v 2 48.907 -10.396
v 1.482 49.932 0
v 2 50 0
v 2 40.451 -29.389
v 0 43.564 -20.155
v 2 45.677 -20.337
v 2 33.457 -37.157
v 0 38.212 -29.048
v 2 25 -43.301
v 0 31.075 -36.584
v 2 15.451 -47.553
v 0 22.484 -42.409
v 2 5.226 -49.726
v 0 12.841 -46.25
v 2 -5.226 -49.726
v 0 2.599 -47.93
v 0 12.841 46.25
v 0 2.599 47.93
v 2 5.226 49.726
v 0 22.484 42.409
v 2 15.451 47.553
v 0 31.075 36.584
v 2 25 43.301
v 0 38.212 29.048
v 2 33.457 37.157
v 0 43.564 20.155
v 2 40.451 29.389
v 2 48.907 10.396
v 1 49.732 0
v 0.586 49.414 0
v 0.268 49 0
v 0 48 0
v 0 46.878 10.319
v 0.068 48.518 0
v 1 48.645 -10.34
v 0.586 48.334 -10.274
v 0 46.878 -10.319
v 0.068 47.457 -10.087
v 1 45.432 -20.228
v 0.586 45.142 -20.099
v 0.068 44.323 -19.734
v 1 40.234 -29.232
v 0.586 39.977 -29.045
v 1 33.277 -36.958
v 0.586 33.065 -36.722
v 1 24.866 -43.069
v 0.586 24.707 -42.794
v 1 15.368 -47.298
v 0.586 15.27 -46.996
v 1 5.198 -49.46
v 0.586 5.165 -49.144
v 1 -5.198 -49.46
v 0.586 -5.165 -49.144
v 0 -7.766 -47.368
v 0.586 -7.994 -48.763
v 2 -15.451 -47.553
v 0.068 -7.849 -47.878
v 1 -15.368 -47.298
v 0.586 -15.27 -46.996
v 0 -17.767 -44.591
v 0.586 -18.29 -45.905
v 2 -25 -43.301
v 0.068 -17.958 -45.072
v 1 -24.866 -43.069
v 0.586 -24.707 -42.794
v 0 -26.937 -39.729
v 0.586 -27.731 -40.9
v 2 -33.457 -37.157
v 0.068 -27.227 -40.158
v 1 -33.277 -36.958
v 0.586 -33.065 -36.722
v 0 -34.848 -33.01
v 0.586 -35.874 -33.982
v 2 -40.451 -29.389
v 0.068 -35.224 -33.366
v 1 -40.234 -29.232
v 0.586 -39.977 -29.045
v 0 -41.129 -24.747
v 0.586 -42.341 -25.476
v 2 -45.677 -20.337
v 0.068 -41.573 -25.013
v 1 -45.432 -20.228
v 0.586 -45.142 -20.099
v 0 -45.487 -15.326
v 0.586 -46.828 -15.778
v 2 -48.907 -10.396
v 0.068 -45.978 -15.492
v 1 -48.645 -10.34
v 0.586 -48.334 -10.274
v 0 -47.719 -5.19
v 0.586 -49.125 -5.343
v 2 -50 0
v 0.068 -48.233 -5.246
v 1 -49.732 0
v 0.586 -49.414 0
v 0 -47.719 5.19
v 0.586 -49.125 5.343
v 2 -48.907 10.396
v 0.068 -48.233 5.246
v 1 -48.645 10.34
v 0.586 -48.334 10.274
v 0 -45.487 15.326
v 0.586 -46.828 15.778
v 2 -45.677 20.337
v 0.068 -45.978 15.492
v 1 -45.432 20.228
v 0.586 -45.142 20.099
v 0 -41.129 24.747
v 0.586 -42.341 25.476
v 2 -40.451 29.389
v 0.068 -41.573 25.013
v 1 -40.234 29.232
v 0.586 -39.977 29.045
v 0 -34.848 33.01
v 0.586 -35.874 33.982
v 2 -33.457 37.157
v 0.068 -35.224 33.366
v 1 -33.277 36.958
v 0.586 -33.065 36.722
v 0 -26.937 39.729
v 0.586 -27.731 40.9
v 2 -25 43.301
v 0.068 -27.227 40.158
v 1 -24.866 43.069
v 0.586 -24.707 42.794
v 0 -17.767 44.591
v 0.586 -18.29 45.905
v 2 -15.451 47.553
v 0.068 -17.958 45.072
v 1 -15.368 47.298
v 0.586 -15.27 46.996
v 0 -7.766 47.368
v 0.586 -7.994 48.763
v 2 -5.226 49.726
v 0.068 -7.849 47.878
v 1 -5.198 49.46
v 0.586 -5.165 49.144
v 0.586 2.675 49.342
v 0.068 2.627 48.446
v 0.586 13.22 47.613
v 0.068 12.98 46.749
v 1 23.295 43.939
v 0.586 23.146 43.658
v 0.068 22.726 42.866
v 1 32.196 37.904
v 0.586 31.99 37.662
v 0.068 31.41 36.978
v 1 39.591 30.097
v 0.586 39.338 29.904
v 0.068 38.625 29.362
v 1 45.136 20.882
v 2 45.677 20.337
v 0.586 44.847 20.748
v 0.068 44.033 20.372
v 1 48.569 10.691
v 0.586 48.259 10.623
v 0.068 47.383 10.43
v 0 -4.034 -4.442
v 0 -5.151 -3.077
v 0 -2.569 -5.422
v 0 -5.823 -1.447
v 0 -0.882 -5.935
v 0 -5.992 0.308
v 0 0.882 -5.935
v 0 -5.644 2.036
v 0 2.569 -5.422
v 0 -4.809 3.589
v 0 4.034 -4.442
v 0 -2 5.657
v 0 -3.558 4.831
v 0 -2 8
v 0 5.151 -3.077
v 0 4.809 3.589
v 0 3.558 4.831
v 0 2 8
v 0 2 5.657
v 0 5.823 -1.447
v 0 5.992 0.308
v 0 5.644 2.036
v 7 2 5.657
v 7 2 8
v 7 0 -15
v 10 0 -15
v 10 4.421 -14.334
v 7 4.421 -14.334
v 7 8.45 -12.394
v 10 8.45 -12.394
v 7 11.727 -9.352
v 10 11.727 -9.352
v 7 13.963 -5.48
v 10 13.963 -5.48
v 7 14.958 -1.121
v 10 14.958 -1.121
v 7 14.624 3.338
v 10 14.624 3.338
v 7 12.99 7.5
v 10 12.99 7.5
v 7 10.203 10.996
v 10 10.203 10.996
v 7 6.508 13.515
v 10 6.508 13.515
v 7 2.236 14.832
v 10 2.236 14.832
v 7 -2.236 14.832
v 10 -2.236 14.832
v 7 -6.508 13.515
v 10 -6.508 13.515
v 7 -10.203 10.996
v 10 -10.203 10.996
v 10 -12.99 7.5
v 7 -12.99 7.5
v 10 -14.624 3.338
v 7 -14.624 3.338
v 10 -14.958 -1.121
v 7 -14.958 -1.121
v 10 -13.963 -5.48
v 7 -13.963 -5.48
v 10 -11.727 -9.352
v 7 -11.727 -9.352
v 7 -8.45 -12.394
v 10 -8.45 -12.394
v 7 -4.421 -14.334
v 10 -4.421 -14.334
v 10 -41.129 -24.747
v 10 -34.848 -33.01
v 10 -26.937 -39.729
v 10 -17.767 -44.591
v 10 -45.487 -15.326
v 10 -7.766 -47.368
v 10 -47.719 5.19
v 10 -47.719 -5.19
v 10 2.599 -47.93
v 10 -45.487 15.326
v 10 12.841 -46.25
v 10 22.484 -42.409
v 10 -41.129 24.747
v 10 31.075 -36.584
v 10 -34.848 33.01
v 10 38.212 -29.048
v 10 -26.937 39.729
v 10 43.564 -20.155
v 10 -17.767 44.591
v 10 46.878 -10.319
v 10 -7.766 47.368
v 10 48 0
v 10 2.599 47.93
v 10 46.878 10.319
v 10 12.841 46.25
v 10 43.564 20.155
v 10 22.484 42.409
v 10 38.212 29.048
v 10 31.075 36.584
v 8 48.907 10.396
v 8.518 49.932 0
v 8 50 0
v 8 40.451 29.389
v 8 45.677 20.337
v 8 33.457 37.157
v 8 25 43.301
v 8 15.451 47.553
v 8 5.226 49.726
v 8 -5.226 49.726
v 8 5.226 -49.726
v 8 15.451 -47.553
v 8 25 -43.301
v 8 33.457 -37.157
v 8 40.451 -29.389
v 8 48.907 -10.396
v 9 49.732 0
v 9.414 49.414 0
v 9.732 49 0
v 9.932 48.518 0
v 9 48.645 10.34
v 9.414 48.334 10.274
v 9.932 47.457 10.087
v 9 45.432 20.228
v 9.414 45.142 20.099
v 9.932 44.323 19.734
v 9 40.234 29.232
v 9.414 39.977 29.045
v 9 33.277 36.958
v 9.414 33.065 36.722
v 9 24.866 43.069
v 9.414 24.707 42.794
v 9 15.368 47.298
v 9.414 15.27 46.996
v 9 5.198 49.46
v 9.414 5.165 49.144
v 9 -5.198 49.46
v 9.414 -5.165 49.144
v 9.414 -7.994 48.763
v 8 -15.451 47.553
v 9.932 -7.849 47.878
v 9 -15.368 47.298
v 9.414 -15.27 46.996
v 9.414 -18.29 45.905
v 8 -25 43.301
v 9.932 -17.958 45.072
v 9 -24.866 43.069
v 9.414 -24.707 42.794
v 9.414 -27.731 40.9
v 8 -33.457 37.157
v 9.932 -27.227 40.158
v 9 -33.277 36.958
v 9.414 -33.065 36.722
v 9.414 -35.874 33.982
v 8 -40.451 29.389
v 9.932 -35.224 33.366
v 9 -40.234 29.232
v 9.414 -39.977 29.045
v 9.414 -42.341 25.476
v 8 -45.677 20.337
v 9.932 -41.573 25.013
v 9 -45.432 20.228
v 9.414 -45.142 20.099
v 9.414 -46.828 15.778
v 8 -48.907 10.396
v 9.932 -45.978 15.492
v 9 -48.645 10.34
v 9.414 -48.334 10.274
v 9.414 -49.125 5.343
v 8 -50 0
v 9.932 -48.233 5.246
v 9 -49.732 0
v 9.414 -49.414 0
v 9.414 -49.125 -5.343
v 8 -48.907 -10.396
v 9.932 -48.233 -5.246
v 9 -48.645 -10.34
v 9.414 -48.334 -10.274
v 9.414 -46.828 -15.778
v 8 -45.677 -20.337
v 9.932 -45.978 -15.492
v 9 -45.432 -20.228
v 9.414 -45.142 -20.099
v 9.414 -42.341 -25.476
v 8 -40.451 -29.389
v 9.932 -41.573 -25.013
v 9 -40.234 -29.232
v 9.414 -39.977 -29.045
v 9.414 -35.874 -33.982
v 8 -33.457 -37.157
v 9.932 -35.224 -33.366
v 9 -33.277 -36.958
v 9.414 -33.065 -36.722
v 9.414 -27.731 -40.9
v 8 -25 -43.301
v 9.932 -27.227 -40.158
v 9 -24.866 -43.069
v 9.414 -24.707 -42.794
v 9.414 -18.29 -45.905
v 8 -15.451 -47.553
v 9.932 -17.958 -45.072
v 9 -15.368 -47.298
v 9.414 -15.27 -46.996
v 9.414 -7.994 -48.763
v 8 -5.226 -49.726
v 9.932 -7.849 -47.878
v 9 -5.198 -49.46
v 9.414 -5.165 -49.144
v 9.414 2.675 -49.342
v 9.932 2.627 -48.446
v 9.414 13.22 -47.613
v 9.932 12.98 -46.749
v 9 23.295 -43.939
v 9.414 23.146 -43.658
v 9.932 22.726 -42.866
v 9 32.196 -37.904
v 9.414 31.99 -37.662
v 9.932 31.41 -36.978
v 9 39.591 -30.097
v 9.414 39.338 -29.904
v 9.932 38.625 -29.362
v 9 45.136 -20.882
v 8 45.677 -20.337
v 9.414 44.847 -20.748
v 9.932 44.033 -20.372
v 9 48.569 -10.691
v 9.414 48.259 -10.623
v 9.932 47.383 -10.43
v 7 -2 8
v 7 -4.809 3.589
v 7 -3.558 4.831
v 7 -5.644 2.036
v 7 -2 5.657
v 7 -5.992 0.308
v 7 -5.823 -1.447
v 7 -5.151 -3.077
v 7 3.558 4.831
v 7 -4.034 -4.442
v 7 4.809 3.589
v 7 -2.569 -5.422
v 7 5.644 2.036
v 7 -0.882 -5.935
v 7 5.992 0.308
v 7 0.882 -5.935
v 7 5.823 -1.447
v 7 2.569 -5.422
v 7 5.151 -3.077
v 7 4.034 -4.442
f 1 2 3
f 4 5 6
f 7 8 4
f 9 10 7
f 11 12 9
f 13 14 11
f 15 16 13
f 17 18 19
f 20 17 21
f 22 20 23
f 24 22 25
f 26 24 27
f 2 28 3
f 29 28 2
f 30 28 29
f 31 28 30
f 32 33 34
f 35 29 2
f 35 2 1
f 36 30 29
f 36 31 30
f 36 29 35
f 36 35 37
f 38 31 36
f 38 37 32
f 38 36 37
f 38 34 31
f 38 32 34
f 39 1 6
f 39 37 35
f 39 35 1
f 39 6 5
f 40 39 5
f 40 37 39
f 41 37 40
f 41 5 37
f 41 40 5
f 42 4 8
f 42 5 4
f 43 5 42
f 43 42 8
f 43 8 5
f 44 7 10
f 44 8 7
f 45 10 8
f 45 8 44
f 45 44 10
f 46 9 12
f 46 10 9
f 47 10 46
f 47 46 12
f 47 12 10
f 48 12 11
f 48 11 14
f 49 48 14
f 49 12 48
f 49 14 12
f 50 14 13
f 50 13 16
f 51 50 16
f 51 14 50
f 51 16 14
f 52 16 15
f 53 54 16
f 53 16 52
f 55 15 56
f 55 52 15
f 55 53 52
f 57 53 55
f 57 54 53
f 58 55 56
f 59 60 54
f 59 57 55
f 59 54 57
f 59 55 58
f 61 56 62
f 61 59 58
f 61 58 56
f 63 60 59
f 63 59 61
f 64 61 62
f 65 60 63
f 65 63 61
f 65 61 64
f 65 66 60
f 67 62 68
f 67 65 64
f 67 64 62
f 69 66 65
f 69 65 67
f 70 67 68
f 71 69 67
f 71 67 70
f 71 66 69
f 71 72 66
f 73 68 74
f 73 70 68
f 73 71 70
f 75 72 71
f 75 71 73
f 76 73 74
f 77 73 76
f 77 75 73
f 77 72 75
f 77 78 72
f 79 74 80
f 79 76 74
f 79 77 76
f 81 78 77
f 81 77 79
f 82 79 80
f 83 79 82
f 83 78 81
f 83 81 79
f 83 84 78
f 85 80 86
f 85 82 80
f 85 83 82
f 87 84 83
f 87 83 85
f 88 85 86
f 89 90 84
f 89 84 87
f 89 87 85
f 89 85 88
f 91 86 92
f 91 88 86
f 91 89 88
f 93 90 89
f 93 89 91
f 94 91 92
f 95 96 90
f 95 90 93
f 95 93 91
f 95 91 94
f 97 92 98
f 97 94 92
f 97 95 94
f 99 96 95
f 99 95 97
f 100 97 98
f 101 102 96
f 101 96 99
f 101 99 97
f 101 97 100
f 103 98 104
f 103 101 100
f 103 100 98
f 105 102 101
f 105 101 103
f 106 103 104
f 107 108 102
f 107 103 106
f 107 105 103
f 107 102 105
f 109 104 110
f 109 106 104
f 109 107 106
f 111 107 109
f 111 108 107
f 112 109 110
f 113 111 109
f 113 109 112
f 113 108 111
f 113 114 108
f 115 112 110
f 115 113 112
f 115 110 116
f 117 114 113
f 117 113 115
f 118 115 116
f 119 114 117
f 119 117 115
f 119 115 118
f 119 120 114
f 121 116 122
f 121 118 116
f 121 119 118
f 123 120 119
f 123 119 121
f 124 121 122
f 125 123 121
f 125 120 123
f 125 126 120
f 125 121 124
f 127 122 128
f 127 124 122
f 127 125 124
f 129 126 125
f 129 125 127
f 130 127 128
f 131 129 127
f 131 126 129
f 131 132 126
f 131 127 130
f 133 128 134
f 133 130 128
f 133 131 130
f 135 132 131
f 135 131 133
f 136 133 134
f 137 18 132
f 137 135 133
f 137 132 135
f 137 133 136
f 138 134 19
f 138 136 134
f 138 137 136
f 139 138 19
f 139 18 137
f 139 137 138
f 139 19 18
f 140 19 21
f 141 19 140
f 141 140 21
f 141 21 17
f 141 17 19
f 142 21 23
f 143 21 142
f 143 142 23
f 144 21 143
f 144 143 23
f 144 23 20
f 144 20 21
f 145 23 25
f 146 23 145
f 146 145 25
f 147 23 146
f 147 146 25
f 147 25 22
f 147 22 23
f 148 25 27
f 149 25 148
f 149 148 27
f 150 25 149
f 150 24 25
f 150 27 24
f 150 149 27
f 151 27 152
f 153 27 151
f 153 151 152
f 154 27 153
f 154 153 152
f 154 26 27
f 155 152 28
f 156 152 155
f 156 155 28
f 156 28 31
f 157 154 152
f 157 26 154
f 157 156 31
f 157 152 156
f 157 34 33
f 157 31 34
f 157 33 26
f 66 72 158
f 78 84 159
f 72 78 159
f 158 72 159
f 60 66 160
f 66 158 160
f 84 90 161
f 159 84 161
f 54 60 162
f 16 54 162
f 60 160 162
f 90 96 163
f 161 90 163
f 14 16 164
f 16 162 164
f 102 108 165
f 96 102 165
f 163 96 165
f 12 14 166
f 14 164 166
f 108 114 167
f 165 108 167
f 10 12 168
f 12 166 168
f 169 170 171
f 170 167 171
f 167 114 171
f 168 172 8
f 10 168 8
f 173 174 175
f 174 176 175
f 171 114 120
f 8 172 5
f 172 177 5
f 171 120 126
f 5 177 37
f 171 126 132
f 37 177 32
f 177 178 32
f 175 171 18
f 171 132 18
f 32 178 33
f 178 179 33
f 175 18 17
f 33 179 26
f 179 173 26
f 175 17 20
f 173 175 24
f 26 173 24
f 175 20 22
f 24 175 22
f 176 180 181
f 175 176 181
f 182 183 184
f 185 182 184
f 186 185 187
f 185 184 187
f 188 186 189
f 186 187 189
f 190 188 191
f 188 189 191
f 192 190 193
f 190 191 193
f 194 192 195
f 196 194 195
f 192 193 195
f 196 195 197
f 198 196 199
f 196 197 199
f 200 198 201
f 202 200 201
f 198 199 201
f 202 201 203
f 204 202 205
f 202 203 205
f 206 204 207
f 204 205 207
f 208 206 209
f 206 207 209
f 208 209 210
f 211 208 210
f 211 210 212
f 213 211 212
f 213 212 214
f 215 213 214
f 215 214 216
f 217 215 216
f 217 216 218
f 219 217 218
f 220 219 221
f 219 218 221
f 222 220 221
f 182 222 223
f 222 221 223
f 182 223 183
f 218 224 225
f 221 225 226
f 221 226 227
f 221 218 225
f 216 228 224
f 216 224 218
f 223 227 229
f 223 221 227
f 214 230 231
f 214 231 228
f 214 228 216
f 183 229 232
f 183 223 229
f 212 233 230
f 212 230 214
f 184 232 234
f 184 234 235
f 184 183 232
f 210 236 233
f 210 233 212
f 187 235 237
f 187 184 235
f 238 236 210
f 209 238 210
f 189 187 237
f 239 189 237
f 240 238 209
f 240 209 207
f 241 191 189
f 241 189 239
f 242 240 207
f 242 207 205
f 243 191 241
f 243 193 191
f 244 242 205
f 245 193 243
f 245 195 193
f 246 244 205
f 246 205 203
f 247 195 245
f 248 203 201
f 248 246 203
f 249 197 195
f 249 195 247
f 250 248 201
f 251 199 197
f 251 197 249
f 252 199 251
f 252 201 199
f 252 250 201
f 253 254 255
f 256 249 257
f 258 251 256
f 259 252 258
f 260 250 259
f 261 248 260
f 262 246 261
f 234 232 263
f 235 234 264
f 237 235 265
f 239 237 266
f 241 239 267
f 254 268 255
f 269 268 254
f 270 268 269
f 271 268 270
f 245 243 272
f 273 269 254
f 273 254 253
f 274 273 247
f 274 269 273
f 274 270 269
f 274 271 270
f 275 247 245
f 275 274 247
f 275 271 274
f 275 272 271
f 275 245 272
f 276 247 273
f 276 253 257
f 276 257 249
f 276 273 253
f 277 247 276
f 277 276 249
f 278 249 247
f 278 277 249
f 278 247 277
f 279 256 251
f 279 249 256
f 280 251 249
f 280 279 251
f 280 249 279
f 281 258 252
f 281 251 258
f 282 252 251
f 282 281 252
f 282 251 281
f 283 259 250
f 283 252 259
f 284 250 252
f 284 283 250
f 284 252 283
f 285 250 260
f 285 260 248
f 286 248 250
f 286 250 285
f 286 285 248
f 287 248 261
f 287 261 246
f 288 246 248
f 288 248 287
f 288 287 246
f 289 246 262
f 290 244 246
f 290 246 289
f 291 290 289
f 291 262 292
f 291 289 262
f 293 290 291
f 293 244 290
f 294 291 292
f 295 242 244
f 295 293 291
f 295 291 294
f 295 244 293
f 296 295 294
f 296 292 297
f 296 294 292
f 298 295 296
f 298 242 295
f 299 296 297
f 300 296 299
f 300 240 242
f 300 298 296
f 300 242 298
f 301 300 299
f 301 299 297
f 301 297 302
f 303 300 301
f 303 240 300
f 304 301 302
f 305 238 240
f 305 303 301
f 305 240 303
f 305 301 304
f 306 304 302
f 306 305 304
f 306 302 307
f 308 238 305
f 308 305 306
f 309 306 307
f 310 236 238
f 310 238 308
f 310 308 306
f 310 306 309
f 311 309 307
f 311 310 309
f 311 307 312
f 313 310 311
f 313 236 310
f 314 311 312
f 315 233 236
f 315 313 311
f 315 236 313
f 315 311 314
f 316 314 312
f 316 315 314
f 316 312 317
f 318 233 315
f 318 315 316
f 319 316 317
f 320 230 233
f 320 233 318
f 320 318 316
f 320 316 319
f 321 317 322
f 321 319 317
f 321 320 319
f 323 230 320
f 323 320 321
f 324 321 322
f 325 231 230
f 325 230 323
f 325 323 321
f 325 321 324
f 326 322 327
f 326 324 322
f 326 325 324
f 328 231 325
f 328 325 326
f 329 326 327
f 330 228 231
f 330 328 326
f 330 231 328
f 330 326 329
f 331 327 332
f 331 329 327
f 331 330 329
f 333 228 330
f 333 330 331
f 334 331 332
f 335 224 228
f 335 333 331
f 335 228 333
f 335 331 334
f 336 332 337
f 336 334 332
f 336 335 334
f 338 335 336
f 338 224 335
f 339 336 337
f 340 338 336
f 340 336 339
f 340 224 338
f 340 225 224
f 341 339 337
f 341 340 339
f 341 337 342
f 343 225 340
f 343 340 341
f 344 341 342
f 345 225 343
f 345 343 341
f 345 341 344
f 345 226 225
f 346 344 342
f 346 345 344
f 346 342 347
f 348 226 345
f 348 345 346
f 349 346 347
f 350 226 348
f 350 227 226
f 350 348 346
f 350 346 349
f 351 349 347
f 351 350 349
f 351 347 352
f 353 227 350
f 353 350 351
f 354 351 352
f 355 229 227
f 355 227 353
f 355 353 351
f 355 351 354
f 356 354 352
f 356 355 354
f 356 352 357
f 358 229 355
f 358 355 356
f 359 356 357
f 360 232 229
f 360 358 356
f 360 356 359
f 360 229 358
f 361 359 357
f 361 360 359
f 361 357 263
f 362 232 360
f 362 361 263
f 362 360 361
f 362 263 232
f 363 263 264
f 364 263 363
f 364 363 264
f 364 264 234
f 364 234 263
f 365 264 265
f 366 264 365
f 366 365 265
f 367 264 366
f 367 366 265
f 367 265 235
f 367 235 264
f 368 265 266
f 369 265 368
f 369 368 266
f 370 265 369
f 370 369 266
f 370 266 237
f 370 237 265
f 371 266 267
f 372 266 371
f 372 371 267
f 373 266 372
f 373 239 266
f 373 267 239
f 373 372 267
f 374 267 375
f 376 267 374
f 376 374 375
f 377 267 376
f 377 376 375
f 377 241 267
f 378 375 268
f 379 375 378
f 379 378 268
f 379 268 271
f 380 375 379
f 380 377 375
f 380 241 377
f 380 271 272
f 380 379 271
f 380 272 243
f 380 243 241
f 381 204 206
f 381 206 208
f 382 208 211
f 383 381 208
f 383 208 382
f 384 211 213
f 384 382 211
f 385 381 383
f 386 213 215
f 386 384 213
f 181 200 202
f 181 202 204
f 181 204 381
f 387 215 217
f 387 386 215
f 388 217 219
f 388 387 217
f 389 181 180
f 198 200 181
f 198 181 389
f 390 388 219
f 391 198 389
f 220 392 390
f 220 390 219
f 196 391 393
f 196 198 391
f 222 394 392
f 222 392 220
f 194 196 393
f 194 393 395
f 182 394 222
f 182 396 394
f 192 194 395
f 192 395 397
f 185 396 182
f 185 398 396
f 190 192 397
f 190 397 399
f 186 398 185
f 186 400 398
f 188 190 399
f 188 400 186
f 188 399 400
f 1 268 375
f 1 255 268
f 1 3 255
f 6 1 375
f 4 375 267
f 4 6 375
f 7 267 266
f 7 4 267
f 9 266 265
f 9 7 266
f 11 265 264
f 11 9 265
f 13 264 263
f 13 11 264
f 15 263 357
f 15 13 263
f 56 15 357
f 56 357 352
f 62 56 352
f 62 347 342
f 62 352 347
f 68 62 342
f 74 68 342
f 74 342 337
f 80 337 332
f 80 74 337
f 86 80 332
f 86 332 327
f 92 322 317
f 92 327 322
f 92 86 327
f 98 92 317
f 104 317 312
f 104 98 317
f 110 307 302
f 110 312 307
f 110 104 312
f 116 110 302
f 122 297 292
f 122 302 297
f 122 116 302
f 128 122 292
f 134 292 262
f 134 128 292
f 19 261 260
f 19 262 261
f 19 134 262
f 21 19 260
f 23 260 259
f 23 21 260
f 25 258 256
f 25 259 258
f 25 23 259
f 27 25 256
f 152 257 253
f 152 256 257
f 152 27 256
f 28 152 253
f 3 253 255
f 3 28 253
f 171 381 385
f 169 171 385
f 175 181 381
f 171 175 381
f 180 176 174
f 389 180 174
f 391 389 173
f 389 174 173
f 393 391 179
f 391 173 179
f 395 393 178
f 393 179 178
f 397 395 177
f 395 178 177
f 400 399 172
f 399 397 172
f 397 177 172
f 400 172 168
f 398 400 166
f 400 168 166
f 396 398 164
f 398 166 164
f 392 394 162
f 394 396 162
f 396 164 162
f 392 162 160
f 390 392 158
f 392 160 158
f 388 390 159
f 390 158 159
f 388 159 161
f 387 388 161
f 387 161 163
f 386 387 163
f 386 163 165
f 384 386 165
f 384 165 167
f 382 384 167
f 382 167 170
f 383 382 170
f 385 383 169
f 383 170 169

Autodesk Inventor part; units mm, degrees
ref_plane "YZ Plane" through (0, 0, 0) normal (1, 0, 0) x (0, 1, 0)
ref_plane "XZ Plane" through (0, 0, 0) normal (0, 1, 0) x (-1, 0, 0)
ref_plane "XY Plane" through (0, 0, 0) normal (0, 0, 1) x (1, 0, 0)
sketch "Sketch1" plane through (0, 0, 0) normal (1, 0, 0) x (0, 1, 0)
  circle A0 centre (0, 0) radius 50
  dimension "d0" = 100
extrude "Extrusion1" add sketch "Sketch1" along normal blind 10
sketch "Sketch2" plane through (10, 0, 0) normal (1, 0, 0) x (0, 0, -1)
  circle A0 centre (0, 0) radius 50 projected
hole "Hole1" at (10, 0, 0) direction (-1, 0, 0) diameter 12 depth 10
fillet "Fillet1" radius 2 2 edges at (0, -50, 0) (10, -50, 0)
sketch "Sketch4" plane through (10, 0, 0) normal (1, 0, 0) x (0, 0, -1)
  circle A0 centre (0, 0) radius 15
  dimension "d18" = 30
extrude "Extrusion3" cut sketch "Sketch4" against normal blind 3
sketch "Sketch5" plane through (7, 0, 0) normal (1, 0, 0) x (0, 0, -1)
  circle A0 centre (0, 0) radius 6 projected
  line L0 (-6, 0) -> (-6, 2)
  line L1 (-6, 2) -> (-8, 2)
  line L2 (-8, 2) -> (-8, -2)
  line L3 (-8, -2) -> (-6, -2)
  line L4 (-6, -2) -> (-6, 0)
  line L5 (-6, -2) -> (-4.5, -2)
  line L6 (-4.5, -2) -> (-4.5, 2)
  line L7 (-4.5, 2) -> (-6, 2)
  point P0 (-7, -2)
  dimension "d21" = 2
  dimension "d22" = 4
  dimension "d23" = 2
  dimension "d24" = 1.5
  dimension "d25" = 4
extrude "Extrusion4" cut sketch "Sketch5" against normal blind 7 contours L7 L6 L5 A0 | A0 L0 L7 | L5 L4 A0 | L4 L3 L2 L1 L0 picked at (-5, 0)
properties part number "P203" material "Aluminum 6061"
